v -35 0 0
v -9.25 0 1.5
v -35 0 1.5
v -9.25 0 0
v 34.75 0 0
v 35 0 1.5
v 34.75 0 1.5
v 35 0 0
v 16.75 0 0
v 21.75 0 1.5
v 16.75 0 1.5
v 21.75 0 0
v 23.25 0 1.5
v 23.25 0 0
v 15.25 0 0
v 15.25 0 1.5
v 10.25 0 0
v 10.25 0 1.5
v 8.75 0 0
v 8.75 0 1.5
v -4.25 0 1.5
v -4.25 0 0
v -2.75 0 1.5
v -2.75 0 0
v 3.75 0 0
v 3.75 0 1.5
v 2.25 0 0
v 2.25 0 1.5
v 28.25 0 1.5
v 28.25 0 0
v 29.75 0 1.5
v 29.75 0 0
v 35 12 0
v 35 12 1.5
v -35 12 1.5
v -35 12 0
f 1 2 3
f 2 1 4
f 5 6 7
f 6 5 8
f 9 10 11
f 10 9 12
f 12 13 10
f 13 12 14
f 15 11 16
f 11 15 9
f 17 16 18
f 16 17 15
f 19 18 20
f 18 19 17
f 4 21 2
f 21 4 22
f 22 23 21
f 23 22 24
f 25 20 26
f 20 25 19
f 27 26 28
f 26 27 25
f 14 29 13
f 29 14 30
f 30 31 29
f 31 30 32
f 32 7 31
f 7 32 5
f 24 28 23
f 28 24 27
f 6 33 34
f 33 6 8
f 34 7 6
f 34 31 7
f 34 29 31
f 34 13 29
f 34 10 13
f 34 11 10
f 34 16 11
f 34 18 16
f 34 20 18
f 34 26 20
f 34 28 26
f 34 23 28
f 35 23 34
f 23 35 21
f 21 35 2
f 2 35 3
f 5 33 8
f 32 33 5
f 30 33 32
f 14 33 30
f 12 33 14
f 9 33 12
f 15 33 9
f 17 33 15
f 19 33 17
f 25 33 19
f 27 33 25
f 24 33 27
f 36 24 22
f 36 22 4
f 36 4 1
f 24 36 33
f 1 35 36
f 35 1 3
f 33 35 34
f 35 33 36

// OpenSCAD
// 10-well comb for agarose gel casting
// Printed lying flat on the bed

num_wells   = 10;    // number of wells
channel_w   = 70;    // channel length (X)
channel_d   = 12;    // channel width (Y)
well_w      = 5;     // well width (X)
well_l      = 12;    // well length (Y)
gap         = 1.5;   // gap between neighbouring wells (X)
thickness   = 1.5;   // plate thickness (Z)

$fn = 64;

pitch = well_w + gap;   // centre-to-centre spacing
x0    = -(num_wells - 1) * gap / 2;  // first well left edge

difference() {
    // Channel (back bar)
    translate([-channel_w / 2, 0, 0])
        cube([channel_w, channel_d, thickness]);

    // Wells
    for (i = [0 : num_wells - 1])
        translate([x0 + i * pitch - well_w / 2, -well_l, 0])
            cube([well_w, well_l, thickness + 1]);
}
